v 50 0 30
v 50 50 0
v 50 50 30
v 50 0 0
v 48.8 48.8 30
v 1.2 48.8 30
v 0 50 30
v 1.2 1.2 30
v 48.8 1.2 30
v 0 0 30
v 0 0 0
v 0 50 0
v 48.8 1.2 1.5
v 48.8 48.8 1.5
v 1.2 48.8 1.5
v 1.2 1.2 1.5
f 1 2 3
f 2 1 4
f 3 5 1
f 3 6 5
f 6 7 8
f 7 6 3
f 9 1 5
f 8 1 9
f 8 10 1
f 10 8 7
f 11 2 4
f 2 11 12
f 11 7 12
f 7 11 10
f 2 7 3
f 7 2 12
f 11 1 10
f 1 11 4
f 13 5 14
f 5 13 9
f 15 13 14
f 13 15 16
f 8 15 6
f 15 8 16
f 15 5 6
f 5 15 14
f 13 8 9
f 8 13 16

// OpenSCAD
$fn = 32;

// ----------------------------------------------------------------------
// Open box: 1.2 mm walls
// ----------------------------------------------------------------------

// --- parameters (mm) ---
box_l = 50;               // outer length, X
box_w = 50;               // outer width, Y
box_h = 30;               // outer height, Z
wall = 1.2;               // wall thickness
floor = 1.5;              // floor thickness

difference() {
  cube([box_l, box_w, box_h]);
  translate([wall, wall, floor])
    cube([box_l - 2 * wall, box_w - 2 * wall, box_h]);
}
